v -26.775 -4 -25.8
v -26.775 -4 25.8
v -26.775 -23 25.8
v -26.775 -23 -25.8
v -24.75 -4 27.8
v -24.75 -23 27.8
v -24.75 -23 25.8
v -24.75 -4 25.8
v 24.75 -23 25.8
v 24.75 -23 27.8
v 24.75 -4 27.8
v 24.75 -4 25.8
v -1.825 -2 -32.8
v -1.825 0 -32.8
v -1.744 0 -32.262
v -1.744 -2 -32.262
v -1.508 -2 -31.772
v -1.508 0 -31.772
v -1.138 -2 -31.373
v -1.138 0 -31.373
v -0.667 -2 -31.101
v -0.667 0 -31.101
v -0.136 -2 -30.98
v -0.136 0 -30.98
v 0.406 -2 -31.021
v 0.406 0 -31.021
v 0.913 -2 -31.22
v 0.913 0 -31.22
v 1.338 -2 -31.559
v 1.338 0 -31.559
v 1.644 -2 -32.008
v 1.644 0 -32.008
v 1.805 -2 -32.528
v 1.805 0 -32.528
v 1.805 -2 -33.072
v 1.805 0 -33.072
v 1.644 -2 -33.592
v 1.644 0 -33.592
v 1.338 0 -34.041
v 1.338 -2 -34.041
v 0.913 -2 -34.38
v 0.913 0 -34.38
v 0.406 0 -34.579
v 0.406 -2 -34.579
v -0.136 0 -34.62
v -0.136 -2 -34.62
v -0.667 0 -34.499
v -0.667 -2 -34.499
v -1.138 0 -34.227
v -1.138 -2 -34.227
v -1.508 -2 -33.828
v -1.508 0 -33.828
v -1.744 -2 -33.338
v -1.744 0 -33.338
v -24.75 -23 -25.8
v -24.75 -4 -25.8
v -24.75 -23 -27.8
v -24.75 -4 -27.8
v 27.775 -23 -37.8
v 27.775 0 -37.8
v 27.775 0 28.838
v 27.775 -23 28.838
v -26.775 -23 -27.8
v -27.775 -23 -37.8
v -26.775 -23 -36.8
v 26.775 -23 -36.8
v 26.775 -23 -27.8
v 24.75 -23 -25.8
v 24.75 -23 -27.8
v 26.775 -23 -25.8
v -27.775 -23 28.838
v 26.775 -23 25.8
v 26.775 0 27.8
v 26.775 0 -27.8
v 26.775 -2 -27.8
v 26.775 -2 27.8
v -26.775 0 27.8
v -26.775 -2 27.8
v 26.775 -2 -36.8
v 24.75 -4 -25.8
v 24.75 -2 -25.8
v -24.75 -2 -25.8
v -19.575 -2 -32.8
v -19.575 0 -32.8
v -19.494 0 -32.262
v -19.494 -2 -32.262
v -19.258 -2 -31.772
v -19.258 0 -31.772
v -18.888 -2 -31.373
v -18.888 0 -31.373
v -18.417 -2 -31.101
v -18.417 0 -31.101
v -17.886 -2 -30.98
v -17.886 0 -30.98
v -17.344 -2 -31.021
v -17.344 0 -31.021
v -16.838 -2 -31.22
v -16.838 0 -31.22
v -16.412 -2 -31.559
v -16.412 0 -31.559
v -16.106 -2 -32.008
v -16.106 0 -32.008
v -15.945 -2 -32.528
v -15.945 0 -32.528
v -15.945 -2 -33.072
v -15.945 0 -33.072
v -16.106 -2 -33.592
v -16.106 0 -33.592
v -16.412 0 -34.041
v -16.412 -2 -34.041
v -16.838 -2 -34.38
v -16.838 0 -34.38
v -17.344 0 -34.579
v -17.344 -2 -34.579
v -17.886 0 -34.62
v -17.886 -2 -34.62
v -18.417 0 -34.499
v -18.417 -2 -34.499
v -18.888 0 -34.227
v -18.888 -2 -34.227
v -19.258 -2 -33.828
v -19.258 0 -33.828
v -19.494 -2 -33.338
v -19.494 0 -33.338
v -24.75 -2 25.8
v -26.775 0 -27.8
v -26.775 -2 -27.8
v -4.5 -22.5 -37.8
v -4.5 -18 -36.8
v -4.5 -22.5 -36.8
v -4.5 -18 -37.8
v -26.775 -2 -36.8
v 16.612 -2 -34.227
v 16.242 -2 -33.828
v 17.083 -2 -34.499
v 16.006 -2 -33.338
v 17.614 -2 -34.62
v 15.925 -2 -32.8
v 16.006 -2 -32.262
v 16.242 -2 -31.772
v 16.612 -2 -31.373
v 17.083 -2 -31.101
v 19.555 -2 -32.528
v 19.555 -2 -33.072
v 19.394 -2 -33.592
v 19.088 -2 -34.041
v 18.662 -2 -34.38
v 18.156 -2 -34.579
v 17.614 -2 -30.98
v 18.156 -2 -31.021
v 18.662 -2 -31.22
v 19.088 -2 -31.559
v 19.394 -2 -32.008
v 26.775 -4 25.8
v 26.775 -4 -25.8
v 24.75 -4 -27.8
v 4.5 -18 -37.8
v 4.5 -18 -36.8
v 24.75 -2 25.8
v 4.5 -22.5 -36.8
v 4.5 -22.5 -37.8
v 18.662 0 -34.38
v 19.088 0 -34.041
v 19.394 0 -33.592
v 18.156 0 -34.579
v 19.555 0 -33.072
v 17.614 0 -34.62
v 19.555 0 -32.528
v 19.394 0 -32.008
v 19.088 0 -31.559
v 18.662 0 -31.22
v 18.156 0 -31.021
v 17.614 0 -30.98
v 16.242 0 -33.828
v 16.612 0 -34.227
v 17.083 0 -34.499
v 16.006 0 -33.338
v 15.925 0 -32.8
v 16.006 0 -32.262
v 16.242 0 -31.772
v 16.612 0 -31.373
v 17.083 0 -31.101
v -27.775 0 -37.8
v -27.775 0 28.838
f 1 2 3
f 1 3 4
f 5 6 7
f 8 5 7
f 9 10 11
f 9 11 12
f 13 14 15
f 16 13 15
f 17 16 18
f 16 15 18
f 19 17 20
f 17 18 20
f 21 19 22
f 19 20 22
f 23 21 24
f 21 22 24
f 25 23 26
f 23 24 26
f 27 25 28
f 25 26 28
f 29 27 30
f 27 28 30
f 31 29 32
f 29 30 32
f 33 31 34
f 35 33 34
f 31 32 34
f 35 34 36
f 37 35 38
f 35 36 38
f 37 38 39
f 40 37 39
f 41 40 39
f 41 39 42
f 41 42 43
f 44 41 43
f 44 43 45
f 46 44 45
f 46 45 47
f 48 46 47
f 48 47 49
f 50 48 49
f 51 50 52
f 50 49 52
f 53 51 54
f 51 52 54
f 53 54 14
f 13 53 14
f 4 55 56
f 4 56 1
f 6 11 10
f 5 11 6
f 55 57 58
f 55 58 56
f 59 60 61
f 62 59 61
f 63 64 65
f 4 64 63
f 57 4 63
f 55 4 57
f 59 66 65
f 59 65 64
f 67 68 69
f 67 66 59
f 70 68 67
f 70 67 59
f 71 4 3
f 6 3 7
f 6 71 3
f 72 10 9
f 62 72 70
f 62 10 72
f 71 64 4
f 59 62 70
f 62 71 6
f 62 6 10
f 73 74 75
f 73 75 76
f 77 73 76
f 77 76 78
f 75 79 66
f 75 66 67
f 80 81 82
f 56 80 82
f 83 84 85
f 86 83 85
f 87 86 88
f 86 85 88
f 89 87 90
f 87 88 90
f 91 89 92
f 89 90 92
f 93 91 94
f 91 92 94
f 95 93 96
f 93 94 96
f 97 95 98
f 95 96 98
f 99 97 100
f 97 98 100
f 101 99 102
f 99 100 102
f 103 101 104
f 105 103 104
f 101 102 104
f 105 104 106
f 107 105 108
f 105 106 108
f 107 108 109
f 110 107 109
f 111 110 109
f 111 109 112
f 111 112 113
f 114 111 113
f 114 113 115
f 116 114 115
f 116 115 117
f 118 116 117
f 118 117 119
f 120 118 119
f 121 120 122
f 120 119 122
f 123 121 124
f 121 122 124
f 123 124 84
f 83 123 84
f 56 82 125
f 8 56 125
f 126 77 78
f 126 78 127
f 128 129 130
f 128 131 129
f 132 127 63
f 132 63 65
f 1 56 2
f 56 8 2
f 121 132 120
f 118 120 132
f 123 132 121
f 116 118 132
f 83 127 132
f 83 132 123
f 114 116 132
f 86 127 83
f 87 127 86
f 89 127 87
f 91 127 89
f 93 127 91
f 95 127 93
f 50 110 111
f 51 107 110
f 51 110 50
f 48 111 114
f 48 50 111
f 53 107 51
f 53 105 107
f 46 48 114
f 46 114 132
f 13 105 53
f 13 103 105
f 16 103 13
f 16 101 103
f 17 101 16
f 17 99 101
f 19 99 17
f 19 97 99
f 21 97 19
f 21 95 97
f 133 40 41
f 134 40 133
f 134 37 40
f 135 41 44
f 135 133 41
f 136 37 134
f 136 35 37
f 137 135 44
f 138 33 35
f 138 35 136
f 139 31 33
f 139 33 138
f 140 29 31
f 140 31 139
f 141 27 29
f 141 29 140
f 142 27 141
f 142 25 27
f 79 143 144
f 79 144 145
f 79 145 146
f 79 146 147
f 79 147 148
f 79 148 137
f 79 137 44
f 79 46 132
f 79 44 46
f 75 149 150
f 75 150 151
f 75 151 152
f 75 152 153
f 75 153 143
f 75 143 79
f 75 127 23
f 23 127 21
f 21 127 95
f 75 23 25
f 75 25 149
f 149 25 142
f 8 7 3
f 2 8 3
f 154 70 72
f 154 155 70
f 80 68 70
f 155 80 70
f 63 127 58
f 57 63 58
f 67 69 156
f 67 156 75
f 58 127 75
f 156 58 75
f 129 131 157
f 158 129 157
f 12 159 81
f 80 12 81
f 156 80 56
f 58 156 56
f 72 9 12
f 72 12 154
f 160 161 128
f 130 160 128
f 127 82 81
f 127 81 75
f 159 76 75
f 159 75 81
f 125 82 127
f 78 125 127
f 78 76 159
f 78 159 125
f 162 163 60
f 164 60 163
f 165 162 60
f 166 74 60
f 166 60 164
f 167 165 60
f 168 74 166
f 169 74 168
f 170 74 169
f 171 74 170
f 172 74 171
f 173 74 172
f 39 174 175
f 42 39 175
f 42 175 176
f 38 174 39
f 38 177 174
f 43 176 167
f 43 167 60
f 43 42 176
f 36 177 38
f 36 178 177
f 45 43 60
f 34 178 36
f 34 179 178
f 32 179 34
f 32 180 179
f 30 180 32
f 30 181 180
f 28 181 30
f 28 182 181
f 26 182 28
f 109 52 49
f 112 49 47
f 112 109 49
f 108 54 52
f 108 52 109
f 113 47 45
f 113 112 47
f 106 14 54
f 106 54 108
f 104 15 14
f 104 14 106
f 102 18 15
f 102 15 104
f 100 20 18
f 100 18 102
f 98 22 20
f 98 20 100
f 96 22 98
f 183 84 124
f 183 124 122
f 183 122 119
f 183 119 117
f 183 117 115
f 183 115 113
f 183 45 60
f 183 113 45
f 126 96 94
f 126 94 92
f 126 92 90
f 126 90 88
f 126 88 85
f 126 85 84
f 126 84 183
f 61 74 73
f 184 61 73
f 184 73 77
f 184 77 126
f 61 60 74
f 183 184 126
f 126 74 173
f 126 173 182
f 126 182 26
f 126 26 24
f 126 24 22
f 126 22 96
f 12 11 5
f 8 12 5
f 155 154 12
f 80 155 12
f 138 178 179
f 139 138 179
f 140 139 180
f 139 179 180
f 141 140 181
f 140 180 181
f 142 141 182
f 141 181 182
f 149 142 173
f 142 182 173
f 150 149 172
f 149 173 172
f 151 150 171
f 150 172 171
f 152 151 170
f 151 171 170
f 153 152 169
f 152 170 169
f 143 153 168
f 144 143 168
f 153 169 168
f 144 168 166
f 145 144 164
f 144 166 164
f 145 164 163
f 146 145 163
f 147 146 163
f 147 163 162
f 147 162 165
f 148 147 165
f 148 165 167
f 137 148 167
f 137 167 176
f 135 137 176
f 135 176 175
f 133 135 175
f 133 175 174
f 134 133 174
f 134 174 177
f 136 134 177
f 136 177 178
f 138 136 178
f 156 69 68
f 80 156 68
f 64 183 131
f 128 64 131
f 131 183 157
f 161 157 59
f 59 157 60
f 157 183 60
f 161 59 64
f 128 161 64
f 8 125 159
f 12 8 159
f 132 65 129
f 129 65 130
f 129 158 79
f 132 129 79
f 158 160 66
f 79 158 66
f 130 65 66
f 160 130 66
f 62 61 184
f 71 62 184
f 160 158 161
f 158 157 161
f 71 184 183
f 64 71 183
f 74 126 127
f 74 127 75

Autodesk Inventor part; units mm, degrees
ref_plane "YZ Plane" through (0, 0, 0) normal (1, 0, 0) x (0, 1, 0)
ref_plane "XY Plane" through (0, 0, 0) normal (0, 0, 1) x (1, 0, 0)
sketch "Sketch1" plane through (0, 0, 0) normal (0, 1, 0) x (-1, 0, 0)
  line L0 (24.775, -25.7234) -> (-24.775, -25.7234)
  line L1 (-24.775, -25.7234) -> (-24.775, 25.7234)
  line L2 (-24.775, 25.7234) -> (24.775, 25.7234)
  line L3 (24.775, 25.7234) -> (24.775, -25.7234)
  line L4 (24.775, -25.7234) -> (-24.775, 25.7234) construction
  line L5 (-24.775, -25.7234) -> (24.775, 25.7234) construction
  line L6 (26.775, -27.8) -> (-26.775, -27.8)
  line L7 (-26.775, -27.8) -> (-26.775, 27.8)
  line L8 (-26.775, 27.8) -> (26.775, 27.8)
  line L9 (26.775, 27.8) -> (26.775, -27.8)
  line L10 (26.775, -27.8) -> (-26.775, 27.8) construction
  line L11 (-26.775, -27.8) -> (26.775, 27.8) construction
  line L12 (-26.775, -17.5745) -> (-24.775, -17.5745)
  line L13 (27.775, -28.8383) -> (-27.775, -28.8383)
  line L14 (-27.775, -28.8383) -> (-27.775, 28.8383)
  line L15 (-27.775, 28.8383) -> (27.775, 28.8383)
  line L16 (27.775, 28.8383) -> (27.775, -28.8383)
  line L17 (27.775, -28.8383) -> (-27.775, 28.8383) construction
  line L18 (-27.775, -28.8383) -> (27.775, 28.8383) construction
  line L19 (-27.775, -9.8151) -> (-26.775, -9.8151)
  line L20 (-7.9068, 27.8) -> (-7.9068, 28.8383)
  line L21 (27.775, -27.8) -> (27.775, -37.8)
  line L22 (27.775, -37.8) -> (-27.775, -37.8)
  line L23 (-27.775, -37.8) -> (-27.775, -27.8)
  line L24 (27.775, -37.8) -> (27.775, -32.8)
  line L25 (27.775, -32.8) -> (-27.775, -32.8)
  line L26 (27.775, -32.8) -> (15.7648, -32.8)
  line L27 (27.775, -32.8) -> (17.75, -32.8)
  circle A0 centre (17.75, -32.8) radius 1.825
  line L28 (-27.775, -32.8) -> (-17.75, -32.8)
  circle A1 centre (-17.75, -32.8) radius 1.825
  circle A2 centre (0, -32.8) radius 1.825
  point P0 (0, 0)
  point P1 (22.7625, -32.8)
  point P2 (21.7699, -32.8)
  point P3 (-22.7625, -32.8)
  point P4 (-27.775, -28.8383)
  dimension "d0" = 53.55
  dimension "d1" = 55.6
  dimension "d2" = 2
  dimension "d3" = 1
  dimension "d4" = 10
  dimension "d6" = 55.55
  dimension "d8" = 10.025
  dimension "d9" = 3.65
  dimension "d11" = 10.025
  dimension "d12" = 3.65
  dimension "d13" = 3.65
extrude "Extrusion1" add sketch "Sketch1" against normal blind 25 contours L7 L6 L9 L8 L20 L15 L16 L13 L14 L19 | L19 L14 L15 L20 L8 L7 | L13 L21 L25 A0 A2 A1 L23 | L25 A1 A2 A0 L21 L22 L23
sketch "Sketch2" plane through (0, -25, 0) normal (0, -1, 0) x (1, 0, 0)
  line L0 (-26.775, -27.8) -> (-26.775, -36.8)
  line L1 (26.775, -27.8) -> (-26.775, -27.8) projected
  line L2 (-26.775, -36.8) -> (26.775, -36.8)
  line L3 (26.775, -36.8) -> (26.775, -27.8)
  line L4 (26.775, -27.8) -> (-26.775, -27.8)
  line L5 (-26.775, -27.8) -> (-26.775, -36.8)
  point P0 (0, 0)
  dimension "d16" = 9
extrude "Extrusion2" cut sketch "Sketch2" against normal blind 23
ref_plane "Work Plane1" through (0, -2, 0) normal (0, 1, 0) x (-1, 0, 0)
sketch "Sketch3" plane through (0, -2, 0) normal (0, 1, 0) x (-1, 0, 0)
  line L0 (26.775, -27.8) -> (-26.775, -27.8) projected
  line L1 (-26.775, -27.8) -> (-26.775, 27.8) projected
  line L2 (26.775, -27.8) -> (-26.775, -27.8)
  line L3 (-26.775, -27.8) -> (-26.775, 27.8)
  line L4 (-26.775, 27.8) -> (26.775, 27.8)
  line L5 (26.775, 27.8) -> (26.775, -27.8)
  line L6 (24.75, 25.8) -> (-24.75, 25.8)
  line L7 (-24.75, 25.8) -> (-24.75, -25.8)
  line L8 (-24.75, -25.8) -> (24.75, -25.8)
  line L9 (24.75, -25.8) -> (24.75, 25.8)
  line L10 (24.75, 25.8) -> (-24.75, -25.8) construction
  line L11 (-24.75, 25.8) -> (24.75, -25.8) construction
  point P0 (0, 0)
  dimension "d20" = 49.5
  dimension "d21" = 51.6
extrude "Extrusion3" add sketch "Sketch3" against normal blind 2
sketch "Sketch4" plane through (0, -4, 0) normal (0, -1, 0) x (1, 0, 0)
  line L0 (24.75, -25.8) -> (24.75, 25.8) projected
  line L1 (-26.775, -27.8) -> (26.775, -27.8) projected
  line L2 (24.75, -25.8) -> (26.775, -25.8)
  line L3 (26.775, -25.8) -> (26.775, -27.8)
  line L4 (26.775, -27.8) -> (24.75, -27.8)
  line L5 (24.75, -27.8) -> (24.75, -25.8)
  line L6 (24.75, 25.8) -> (-24.75, 25.8) projected
  line L7 (-26.775, 27.8) -> (26.775, 27.8) projected
  line L8 (24.75, 25.8) -> (26.775, 25.8)
  line L9 (26.775, 25.8) -> (26.775, 27.8)
  line L10 (26.775, 27.8) -> (24.75, 27.8)
  line L11 (24.75, 27.8) -> (24.75, 25.8)
  line L12 (-24.75, 25.8) -> (-26.775, 25.8)
  line L13 (-26.775, 25.8) -> (-26.775, 27.8)
  line L14 (-26.775, 27.8) -> (-24.75, 27.8)
  line L15 (-24.75, 27.8) -> (-24.75, 25.8)
  line L16 (-24.75, -25.8) -> (-24.75, 25.8) projected
  line L17 (-24.75, -25.8) -> (-26.775, -25.8)
  line L18 (-26.775, -25.8) -> (-26.775, -27.8)
  line L19 (-26.775, -27.8) -> (-24.75, -27.8)
  line L20 (-24.75, -27.8) -> (-24.75, -25.8)
  point P0 (0, 0)
extrude "Extrusion4" add sketch "Sketch4" along normal blind 21 contours L2 L3 L1 L5 | L11 L7 L9 L8 | L12 L13 L7 L15 | L1 L18 L17 L20
sketch "Sketch5" plane through (27.775, 0, -37.8) normal (0, 0, -1) x (-1, 0, 0)
  line L0 (52.525, -25) -> (3.025, -25) projected
  line L1 (0, 0) -> (55.55, 0) projected
  line L2 (27.775, -18) -> (32.275, -18)
  line L3 (27.775, -18) -> (23.275, -18)
  line L4 (23.275, -18) -> (23.275, -22.5)
  line L5 (32.275, -18) -> (32.275, -22.5)
  line L6 (23.275, -22.5) -> (32.275, -22.5)
  point P0 (27.775, 0)
  point P1 (27.775, 0)
  dimension "d29" = 4.5
  dimension "d30" = 4.5
  dimension "d34" = 4.5
  dimension "d35" = 4.5
sketch "Sketch6" plane through (0, -25, 0) normal (0, -1, 0) x (1, 0, 0)
  line L0 (-27.775, -37.8) -> (27.775, -37.8) projected
  line L1 (27.775, -37.8) -> (27.775, 28.8383) projected
  line L2 (-27.775, -37.8) -> (27.775, -37.8)
  line L3 (27.775, -37.8) -> (27.775, 28.8383)
  line L4 (27.775, 28.8383) -> (-27.775, 28.8383)
  line L5 (-27.775, 28.8383) -> (-27.775, -37.8)
  point P0 (0, 0)
extrude "Extrusion5" cut sketch "Sketch6" against normal blind 2
extrude "Extrusion6" cut sketch "Sketch5" against normal blind 2
properties part number "Mainbody2"
